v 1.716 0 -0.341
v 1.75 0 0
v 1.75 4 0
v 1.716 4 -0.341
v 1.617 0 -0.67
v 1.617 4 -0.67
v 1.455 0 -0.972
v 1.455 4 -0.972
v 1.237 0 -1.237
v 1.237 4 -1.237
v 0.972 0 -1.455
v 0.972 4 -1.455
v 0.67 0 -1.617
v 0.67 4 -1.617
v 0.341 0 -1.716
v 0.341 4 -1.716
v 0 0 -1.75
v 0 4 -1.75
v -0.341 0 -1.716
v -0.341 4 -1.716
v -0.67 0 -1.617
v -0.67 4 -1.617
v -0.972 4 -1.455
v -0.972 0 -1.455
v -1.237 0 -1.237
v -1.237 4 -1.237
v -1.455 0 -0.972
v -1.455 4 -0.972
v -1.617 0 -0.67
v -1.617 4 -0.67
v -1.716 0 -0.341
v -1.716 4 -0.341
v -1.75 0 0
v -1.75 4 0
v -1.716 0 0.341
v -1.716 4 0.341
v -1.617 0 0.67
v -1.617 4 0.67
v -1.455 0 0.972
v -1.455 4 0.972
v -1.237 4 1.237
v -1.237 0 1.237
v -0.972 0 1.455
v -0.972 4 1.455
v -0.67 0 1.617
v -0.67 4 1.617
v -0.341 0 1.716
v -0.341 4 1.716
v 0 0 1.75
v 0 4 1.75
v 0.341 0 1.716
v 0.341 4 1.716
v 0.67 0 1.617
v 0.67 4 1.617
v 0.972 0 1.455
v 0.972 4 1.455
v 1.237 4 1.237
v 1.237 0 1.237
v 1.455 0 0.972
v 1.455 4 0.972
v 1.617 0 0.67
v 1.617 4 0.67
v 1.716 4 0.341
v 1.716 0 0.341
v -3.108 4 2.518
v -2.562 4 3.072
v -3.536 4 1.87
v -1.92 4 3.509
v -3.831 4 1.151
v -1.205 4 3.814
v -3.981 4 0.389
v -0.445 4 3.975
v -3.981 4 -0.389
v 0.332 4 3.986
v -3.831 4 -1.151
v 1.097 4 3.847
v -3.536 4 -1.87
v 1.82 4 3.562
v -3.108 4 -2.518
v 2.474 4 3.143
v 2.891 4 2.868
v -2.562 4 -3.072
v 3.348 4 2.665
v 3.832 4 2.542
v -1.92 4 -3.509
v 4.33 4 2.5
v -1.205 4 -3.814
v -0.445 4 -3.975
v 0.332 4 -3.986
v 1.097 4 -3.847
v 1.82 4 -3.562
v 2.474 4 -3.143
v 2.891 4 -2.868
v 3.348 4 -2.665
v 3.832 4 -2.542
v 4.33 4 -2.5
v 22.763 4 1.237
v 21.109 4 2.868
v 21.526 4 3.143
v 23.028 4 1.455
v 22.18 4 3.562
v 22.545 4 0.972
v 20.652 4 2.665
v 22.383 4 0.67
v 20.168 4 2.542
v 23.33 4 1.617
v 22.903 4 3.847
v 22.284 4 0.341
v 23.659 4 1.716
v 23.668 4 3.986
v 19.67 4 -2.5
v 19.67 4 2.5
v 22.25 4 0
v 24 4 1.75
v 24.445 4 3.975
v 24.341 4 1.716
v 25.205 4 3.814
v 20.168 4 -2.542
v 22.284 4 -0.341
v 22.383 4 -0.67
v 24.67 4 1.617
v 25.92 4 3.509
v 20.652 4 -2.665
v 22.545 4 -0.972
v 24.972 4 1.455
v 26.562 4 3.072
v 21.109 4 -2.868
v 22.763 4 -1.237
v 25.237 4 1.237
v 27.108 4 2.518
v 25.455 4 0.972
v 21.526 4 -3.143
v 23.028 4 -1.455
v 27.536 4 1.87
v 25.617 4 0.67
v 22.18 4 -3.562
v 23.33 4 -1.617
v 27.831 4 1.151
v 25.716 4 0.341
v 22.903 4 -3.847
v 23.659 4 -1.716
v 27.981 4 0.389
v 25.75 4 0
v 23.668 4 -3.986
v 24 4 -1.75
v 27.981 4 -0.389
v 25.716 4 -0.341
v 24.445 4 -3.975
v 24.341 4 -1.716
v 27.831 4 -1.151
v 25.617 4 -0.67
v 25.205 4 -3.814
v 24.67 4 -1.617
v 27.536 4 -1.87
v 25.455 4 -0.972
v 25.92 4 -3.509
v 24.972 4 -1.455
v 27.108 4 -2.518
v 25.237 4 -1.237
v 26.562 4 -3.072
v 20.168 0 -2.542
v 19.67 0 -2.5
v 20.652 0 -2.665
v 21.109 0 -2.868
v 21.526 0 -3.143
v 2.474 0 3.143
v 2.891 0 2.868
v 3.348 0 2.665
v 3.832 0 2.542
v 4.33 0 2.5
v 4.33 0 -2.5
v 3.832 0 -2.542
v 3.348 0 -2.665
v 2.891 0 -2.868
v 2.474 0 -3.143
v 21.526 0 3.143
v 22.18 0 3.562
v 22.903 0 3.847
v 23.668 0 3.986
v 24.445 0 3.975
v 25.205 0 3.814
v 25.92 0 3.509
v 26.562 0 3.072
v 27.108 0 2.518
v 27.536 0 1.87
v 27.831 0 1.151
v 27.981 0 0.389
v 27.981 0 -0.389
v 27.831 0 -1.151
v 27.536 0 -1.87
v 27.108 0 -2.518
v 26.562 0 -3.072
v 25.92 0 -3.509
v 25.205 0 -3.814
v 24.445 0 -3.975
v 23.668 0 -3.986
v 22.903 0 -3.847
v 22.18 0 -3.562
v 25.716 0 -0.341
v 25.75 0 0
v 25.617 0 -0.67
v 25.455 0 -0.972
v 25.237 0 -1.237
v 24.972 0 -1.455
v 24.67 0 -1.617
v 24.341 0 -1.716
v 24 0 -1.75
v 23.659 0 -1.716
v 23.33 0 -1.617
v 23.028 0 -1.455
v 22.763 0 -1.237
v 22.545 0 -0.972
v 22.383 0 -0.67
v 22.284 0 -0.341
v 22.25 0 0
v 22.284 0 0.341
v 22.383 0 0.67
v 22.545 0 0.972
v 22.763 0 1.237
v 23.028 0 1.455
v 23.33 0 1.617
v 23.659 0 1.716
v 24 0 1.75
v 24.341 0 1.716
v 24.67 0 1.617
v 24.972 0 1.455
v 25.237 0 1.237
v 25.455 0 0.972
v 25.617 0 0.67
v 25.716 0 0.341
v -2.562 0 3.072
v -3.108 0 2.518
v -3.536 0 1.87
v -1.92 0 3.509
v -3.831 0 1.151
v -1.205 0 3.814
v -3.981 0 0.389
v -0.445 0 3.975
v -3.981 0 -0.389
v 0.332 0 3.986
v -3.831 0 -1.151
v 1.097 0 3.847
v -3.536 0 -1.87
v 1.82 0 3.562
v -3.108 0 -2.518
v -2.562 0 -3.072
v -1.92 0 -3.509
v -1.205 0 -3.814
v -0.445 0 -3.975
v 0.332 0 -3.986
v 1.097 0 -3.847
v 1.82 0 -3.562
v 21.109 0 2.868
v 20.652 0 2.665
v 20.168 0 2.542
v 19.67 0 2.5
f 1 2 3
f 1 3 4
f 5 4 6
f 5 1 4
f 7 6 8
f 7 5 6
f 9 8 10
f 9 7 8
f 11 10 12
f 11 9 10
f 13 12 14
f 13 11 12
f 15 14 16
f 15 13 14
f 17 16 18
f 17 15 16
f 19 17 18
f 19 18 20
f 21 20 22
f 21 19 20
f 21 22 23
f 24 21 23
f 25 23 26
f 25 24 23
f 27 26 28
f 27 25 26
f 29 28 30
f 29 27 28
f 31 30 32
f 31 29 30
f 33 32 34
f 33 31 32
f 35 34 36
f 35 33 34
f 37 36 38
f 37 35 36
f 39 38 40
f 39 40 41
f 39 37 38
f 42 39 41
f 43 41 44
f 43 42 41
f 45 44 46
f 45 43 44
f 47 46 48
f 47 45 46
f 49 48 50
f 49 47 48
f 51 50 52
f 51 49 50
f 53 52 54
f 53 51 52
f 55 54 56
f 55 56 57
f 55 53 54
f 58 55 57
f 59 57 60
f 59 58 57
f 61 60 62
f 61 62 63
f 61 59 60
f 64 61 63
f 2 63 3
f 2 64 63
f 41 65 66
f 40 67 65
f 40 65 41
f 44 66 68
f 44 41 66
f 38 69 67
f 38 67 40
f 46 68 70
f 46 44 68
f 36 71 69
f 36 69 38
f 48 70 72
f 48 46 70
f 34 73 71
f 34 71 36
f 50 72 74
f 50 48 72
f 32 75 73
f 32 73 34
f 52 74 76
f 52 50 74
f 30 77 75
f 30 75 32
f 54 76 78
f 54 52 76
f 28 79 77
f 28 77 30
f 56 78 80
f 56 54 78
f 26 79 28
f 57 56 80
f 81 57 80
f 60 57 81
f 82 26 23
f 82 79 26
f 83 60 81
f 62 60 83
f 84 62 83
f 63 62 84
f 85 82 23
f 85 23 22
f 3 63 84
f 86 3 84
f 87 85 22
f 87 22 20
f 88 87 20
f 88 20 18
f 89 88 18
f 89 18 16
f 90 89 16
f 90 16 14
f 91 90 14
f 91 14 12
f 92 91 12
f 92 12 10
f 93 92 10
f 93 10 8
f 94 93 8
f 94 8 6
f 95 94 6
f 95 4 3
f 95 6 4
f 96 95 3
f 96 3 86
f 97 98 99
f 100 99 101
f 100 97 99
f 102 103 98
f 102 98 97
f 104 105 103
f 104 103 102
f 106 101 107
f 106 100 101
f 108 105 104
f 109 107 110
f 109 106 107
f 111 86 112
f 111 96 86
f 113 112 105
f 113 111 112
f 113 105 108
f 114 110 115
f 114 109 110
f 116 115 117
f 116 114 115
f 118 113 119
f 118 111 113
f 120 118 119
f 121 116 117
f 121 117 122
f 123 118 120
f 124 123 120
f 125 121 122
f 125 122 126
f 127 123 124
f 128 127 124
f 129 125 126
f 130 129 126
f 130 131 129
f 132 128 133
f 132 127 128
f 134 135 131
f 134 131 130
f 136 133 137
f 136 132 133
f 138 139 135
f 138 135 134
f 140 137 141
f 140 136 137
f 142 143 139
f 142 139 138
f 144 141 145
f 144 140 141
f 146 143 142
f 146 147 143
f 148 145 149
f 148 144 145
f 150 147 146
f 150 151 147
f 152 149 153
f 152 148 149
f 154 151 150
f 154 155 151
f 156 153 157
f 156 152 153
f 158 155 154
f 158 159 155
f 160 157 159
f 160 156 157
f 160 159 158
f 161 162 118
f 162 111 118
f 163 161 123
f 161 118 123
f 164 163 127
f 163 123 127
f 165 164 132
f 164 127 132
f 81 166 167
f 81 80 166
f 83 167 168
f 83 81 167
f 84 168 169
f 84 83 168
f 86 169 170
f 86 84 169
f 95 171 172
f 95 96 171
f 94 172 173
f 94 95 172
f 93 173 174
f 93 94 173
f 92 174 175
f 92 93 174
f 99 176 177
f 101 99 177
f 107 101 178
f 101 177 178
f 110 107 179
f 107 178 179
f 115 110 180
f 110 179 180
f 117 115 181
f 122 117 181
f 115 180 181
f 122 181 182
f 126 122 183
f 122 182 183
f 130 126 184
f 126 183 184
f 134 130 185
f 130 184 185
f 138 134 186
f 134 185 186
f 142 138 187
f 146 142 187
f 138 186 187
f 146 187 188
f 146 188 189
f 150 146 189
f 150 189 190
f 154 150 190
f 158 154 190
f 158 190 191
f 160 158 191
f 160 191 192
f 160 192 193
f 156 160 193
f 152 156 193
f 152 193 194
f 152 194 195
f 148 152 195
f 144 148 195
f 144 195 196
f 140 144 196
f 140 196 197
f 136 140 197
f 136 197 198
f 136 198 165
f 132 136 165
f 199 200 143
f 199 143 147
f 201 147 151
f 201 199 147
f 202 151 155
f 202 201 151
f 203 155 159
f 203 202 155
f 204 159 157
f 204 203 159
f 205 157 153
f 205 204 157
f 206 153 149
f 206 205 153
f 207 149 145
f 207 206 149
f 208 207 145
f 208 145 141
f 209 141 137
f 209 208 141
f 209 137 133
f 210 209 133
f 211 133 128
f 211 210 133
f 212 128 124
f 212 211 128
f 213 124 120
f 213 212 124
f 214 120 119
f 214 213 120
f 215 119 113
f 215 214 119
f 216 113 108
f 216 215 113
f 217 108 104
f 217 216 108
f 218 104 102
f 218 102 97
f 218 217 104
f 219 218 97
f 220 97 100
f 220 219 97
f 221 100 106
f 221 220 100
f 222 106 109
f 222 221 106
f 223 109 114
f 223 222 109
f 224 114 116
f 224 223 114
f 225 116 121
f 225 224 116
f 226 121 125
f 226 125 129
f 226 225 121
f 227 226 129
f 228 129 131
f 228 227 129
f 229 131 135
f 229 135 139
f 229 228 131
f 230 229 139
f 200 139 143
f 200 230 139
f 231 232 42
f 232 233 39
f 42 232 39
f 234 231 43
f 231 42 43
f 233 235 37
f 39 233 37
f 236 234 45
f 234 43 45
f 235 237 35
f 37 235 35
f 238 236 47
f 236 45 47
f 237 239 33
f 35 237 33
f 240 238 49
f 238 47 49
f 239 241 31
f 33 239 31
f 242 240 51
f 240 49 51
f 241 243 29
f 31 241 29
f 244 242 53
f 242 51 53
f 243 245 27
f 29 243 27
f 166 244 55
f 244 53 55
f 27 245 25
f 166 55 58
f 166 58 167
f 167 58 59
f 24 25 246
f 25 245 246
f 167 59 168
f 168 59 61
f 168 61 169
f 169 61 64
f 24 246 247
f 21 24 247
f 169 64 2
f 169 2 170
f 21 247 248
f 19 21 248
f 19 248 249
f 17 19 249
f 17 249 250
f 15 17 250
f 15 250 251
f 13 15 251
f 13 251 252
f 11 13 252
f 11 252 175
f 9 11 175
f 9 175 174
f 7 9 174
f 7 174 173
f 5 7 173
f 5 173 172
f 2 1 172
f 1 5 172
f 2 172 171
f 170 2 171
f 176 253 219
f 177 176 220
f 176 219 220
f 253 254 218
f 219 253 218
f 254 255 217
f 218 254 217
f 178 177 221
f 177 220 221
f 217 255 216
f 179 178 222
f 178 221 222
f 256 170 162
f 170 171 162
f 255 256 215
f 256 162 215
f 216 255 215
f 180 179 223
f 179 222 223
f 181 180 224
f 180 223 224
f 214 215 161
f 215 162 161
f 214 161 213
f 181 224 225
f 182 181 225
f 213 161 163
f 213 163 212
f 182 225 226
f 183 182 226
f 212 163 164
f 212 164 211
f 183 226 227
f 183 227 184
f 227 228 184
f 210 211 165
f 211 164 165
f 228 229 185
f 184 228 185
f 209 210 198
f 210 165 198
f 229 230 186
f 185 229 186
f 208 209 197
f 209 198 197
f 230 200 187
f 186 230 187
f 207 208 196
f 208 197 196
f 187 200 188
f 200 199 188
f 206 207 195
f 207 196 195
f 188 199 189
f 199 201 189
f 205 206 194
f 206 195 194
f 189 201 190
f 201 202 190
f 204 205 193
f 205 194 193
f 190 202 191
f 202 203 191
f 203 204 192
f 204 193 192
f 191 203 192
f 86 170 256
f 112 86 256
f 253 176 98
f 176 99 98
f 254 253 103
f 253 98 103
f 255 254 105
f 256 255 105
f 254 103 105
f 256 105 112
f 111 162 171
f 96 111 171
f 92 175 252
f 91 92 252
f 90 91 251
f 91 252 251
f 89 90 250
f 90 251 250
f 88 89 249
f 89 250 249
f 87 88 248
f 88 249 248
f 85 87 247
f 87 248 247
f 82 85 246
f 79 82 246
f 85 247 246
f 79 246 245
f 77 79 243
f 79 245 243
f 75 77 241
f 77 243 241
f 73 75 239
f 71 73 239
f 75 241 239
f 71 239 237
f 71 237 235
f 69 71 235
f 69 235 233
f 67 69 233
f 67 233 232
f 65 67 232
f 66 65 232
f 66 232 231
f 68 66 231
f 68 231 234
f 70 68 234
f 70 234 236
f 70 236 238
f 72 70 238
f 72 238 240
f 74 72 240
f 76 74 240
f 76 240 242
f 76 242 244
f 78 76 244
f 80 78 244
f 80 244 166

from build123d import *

# Parameters (mm, degrees)
SKETCH1_R           = 1.75
BOSS_EXTRUDE1_DEPTH = 4
FILLET1_R           = 3


with BuildPart() as part:
    # Sketch1 → Boss-Extrude1 (new body)
    with BuildSketch(Plane(origin=(0, 0, 0), x_dir=(1, 0, 0), z_dir=(0, 1, 0))):
        with BuildLine():
            Line((20.877501001, 2.5), (3.122498999, 2.5))
            ThreePointArc((3.122498999, 2.5), (-4, 0), (3.122498999, -2.5))
            Line((3.122498999, -2.5), (20.877501001, -2.5))
            ThreePointArc((20.877501001, -2.5), (28, 0), (20.877501001, 2.5))
        make_face()
        Circle(SKETCH1_R, mode=Mode.SUBTRACT)
        with Locations((24, 0)):
            Circle(SKETCH1_R, mode=Mode.SUBTRACT)
    extrude(amount=BOSS_EXTRUDE1_DEPTH)

    # Fillet1
    fillet1_edges = [part.edges().sort_by_distance(p)[0] for p in [
        (20.877501001, 2, 2.5),
        (3.122498999, 2, 2.5),
        (3.122498999, 2, -2.5),
        (20.877501001, 2, -2.5),
    ]]
    fillet(fillet1_edges, radius=FILLET1_R)


solid = part.part
